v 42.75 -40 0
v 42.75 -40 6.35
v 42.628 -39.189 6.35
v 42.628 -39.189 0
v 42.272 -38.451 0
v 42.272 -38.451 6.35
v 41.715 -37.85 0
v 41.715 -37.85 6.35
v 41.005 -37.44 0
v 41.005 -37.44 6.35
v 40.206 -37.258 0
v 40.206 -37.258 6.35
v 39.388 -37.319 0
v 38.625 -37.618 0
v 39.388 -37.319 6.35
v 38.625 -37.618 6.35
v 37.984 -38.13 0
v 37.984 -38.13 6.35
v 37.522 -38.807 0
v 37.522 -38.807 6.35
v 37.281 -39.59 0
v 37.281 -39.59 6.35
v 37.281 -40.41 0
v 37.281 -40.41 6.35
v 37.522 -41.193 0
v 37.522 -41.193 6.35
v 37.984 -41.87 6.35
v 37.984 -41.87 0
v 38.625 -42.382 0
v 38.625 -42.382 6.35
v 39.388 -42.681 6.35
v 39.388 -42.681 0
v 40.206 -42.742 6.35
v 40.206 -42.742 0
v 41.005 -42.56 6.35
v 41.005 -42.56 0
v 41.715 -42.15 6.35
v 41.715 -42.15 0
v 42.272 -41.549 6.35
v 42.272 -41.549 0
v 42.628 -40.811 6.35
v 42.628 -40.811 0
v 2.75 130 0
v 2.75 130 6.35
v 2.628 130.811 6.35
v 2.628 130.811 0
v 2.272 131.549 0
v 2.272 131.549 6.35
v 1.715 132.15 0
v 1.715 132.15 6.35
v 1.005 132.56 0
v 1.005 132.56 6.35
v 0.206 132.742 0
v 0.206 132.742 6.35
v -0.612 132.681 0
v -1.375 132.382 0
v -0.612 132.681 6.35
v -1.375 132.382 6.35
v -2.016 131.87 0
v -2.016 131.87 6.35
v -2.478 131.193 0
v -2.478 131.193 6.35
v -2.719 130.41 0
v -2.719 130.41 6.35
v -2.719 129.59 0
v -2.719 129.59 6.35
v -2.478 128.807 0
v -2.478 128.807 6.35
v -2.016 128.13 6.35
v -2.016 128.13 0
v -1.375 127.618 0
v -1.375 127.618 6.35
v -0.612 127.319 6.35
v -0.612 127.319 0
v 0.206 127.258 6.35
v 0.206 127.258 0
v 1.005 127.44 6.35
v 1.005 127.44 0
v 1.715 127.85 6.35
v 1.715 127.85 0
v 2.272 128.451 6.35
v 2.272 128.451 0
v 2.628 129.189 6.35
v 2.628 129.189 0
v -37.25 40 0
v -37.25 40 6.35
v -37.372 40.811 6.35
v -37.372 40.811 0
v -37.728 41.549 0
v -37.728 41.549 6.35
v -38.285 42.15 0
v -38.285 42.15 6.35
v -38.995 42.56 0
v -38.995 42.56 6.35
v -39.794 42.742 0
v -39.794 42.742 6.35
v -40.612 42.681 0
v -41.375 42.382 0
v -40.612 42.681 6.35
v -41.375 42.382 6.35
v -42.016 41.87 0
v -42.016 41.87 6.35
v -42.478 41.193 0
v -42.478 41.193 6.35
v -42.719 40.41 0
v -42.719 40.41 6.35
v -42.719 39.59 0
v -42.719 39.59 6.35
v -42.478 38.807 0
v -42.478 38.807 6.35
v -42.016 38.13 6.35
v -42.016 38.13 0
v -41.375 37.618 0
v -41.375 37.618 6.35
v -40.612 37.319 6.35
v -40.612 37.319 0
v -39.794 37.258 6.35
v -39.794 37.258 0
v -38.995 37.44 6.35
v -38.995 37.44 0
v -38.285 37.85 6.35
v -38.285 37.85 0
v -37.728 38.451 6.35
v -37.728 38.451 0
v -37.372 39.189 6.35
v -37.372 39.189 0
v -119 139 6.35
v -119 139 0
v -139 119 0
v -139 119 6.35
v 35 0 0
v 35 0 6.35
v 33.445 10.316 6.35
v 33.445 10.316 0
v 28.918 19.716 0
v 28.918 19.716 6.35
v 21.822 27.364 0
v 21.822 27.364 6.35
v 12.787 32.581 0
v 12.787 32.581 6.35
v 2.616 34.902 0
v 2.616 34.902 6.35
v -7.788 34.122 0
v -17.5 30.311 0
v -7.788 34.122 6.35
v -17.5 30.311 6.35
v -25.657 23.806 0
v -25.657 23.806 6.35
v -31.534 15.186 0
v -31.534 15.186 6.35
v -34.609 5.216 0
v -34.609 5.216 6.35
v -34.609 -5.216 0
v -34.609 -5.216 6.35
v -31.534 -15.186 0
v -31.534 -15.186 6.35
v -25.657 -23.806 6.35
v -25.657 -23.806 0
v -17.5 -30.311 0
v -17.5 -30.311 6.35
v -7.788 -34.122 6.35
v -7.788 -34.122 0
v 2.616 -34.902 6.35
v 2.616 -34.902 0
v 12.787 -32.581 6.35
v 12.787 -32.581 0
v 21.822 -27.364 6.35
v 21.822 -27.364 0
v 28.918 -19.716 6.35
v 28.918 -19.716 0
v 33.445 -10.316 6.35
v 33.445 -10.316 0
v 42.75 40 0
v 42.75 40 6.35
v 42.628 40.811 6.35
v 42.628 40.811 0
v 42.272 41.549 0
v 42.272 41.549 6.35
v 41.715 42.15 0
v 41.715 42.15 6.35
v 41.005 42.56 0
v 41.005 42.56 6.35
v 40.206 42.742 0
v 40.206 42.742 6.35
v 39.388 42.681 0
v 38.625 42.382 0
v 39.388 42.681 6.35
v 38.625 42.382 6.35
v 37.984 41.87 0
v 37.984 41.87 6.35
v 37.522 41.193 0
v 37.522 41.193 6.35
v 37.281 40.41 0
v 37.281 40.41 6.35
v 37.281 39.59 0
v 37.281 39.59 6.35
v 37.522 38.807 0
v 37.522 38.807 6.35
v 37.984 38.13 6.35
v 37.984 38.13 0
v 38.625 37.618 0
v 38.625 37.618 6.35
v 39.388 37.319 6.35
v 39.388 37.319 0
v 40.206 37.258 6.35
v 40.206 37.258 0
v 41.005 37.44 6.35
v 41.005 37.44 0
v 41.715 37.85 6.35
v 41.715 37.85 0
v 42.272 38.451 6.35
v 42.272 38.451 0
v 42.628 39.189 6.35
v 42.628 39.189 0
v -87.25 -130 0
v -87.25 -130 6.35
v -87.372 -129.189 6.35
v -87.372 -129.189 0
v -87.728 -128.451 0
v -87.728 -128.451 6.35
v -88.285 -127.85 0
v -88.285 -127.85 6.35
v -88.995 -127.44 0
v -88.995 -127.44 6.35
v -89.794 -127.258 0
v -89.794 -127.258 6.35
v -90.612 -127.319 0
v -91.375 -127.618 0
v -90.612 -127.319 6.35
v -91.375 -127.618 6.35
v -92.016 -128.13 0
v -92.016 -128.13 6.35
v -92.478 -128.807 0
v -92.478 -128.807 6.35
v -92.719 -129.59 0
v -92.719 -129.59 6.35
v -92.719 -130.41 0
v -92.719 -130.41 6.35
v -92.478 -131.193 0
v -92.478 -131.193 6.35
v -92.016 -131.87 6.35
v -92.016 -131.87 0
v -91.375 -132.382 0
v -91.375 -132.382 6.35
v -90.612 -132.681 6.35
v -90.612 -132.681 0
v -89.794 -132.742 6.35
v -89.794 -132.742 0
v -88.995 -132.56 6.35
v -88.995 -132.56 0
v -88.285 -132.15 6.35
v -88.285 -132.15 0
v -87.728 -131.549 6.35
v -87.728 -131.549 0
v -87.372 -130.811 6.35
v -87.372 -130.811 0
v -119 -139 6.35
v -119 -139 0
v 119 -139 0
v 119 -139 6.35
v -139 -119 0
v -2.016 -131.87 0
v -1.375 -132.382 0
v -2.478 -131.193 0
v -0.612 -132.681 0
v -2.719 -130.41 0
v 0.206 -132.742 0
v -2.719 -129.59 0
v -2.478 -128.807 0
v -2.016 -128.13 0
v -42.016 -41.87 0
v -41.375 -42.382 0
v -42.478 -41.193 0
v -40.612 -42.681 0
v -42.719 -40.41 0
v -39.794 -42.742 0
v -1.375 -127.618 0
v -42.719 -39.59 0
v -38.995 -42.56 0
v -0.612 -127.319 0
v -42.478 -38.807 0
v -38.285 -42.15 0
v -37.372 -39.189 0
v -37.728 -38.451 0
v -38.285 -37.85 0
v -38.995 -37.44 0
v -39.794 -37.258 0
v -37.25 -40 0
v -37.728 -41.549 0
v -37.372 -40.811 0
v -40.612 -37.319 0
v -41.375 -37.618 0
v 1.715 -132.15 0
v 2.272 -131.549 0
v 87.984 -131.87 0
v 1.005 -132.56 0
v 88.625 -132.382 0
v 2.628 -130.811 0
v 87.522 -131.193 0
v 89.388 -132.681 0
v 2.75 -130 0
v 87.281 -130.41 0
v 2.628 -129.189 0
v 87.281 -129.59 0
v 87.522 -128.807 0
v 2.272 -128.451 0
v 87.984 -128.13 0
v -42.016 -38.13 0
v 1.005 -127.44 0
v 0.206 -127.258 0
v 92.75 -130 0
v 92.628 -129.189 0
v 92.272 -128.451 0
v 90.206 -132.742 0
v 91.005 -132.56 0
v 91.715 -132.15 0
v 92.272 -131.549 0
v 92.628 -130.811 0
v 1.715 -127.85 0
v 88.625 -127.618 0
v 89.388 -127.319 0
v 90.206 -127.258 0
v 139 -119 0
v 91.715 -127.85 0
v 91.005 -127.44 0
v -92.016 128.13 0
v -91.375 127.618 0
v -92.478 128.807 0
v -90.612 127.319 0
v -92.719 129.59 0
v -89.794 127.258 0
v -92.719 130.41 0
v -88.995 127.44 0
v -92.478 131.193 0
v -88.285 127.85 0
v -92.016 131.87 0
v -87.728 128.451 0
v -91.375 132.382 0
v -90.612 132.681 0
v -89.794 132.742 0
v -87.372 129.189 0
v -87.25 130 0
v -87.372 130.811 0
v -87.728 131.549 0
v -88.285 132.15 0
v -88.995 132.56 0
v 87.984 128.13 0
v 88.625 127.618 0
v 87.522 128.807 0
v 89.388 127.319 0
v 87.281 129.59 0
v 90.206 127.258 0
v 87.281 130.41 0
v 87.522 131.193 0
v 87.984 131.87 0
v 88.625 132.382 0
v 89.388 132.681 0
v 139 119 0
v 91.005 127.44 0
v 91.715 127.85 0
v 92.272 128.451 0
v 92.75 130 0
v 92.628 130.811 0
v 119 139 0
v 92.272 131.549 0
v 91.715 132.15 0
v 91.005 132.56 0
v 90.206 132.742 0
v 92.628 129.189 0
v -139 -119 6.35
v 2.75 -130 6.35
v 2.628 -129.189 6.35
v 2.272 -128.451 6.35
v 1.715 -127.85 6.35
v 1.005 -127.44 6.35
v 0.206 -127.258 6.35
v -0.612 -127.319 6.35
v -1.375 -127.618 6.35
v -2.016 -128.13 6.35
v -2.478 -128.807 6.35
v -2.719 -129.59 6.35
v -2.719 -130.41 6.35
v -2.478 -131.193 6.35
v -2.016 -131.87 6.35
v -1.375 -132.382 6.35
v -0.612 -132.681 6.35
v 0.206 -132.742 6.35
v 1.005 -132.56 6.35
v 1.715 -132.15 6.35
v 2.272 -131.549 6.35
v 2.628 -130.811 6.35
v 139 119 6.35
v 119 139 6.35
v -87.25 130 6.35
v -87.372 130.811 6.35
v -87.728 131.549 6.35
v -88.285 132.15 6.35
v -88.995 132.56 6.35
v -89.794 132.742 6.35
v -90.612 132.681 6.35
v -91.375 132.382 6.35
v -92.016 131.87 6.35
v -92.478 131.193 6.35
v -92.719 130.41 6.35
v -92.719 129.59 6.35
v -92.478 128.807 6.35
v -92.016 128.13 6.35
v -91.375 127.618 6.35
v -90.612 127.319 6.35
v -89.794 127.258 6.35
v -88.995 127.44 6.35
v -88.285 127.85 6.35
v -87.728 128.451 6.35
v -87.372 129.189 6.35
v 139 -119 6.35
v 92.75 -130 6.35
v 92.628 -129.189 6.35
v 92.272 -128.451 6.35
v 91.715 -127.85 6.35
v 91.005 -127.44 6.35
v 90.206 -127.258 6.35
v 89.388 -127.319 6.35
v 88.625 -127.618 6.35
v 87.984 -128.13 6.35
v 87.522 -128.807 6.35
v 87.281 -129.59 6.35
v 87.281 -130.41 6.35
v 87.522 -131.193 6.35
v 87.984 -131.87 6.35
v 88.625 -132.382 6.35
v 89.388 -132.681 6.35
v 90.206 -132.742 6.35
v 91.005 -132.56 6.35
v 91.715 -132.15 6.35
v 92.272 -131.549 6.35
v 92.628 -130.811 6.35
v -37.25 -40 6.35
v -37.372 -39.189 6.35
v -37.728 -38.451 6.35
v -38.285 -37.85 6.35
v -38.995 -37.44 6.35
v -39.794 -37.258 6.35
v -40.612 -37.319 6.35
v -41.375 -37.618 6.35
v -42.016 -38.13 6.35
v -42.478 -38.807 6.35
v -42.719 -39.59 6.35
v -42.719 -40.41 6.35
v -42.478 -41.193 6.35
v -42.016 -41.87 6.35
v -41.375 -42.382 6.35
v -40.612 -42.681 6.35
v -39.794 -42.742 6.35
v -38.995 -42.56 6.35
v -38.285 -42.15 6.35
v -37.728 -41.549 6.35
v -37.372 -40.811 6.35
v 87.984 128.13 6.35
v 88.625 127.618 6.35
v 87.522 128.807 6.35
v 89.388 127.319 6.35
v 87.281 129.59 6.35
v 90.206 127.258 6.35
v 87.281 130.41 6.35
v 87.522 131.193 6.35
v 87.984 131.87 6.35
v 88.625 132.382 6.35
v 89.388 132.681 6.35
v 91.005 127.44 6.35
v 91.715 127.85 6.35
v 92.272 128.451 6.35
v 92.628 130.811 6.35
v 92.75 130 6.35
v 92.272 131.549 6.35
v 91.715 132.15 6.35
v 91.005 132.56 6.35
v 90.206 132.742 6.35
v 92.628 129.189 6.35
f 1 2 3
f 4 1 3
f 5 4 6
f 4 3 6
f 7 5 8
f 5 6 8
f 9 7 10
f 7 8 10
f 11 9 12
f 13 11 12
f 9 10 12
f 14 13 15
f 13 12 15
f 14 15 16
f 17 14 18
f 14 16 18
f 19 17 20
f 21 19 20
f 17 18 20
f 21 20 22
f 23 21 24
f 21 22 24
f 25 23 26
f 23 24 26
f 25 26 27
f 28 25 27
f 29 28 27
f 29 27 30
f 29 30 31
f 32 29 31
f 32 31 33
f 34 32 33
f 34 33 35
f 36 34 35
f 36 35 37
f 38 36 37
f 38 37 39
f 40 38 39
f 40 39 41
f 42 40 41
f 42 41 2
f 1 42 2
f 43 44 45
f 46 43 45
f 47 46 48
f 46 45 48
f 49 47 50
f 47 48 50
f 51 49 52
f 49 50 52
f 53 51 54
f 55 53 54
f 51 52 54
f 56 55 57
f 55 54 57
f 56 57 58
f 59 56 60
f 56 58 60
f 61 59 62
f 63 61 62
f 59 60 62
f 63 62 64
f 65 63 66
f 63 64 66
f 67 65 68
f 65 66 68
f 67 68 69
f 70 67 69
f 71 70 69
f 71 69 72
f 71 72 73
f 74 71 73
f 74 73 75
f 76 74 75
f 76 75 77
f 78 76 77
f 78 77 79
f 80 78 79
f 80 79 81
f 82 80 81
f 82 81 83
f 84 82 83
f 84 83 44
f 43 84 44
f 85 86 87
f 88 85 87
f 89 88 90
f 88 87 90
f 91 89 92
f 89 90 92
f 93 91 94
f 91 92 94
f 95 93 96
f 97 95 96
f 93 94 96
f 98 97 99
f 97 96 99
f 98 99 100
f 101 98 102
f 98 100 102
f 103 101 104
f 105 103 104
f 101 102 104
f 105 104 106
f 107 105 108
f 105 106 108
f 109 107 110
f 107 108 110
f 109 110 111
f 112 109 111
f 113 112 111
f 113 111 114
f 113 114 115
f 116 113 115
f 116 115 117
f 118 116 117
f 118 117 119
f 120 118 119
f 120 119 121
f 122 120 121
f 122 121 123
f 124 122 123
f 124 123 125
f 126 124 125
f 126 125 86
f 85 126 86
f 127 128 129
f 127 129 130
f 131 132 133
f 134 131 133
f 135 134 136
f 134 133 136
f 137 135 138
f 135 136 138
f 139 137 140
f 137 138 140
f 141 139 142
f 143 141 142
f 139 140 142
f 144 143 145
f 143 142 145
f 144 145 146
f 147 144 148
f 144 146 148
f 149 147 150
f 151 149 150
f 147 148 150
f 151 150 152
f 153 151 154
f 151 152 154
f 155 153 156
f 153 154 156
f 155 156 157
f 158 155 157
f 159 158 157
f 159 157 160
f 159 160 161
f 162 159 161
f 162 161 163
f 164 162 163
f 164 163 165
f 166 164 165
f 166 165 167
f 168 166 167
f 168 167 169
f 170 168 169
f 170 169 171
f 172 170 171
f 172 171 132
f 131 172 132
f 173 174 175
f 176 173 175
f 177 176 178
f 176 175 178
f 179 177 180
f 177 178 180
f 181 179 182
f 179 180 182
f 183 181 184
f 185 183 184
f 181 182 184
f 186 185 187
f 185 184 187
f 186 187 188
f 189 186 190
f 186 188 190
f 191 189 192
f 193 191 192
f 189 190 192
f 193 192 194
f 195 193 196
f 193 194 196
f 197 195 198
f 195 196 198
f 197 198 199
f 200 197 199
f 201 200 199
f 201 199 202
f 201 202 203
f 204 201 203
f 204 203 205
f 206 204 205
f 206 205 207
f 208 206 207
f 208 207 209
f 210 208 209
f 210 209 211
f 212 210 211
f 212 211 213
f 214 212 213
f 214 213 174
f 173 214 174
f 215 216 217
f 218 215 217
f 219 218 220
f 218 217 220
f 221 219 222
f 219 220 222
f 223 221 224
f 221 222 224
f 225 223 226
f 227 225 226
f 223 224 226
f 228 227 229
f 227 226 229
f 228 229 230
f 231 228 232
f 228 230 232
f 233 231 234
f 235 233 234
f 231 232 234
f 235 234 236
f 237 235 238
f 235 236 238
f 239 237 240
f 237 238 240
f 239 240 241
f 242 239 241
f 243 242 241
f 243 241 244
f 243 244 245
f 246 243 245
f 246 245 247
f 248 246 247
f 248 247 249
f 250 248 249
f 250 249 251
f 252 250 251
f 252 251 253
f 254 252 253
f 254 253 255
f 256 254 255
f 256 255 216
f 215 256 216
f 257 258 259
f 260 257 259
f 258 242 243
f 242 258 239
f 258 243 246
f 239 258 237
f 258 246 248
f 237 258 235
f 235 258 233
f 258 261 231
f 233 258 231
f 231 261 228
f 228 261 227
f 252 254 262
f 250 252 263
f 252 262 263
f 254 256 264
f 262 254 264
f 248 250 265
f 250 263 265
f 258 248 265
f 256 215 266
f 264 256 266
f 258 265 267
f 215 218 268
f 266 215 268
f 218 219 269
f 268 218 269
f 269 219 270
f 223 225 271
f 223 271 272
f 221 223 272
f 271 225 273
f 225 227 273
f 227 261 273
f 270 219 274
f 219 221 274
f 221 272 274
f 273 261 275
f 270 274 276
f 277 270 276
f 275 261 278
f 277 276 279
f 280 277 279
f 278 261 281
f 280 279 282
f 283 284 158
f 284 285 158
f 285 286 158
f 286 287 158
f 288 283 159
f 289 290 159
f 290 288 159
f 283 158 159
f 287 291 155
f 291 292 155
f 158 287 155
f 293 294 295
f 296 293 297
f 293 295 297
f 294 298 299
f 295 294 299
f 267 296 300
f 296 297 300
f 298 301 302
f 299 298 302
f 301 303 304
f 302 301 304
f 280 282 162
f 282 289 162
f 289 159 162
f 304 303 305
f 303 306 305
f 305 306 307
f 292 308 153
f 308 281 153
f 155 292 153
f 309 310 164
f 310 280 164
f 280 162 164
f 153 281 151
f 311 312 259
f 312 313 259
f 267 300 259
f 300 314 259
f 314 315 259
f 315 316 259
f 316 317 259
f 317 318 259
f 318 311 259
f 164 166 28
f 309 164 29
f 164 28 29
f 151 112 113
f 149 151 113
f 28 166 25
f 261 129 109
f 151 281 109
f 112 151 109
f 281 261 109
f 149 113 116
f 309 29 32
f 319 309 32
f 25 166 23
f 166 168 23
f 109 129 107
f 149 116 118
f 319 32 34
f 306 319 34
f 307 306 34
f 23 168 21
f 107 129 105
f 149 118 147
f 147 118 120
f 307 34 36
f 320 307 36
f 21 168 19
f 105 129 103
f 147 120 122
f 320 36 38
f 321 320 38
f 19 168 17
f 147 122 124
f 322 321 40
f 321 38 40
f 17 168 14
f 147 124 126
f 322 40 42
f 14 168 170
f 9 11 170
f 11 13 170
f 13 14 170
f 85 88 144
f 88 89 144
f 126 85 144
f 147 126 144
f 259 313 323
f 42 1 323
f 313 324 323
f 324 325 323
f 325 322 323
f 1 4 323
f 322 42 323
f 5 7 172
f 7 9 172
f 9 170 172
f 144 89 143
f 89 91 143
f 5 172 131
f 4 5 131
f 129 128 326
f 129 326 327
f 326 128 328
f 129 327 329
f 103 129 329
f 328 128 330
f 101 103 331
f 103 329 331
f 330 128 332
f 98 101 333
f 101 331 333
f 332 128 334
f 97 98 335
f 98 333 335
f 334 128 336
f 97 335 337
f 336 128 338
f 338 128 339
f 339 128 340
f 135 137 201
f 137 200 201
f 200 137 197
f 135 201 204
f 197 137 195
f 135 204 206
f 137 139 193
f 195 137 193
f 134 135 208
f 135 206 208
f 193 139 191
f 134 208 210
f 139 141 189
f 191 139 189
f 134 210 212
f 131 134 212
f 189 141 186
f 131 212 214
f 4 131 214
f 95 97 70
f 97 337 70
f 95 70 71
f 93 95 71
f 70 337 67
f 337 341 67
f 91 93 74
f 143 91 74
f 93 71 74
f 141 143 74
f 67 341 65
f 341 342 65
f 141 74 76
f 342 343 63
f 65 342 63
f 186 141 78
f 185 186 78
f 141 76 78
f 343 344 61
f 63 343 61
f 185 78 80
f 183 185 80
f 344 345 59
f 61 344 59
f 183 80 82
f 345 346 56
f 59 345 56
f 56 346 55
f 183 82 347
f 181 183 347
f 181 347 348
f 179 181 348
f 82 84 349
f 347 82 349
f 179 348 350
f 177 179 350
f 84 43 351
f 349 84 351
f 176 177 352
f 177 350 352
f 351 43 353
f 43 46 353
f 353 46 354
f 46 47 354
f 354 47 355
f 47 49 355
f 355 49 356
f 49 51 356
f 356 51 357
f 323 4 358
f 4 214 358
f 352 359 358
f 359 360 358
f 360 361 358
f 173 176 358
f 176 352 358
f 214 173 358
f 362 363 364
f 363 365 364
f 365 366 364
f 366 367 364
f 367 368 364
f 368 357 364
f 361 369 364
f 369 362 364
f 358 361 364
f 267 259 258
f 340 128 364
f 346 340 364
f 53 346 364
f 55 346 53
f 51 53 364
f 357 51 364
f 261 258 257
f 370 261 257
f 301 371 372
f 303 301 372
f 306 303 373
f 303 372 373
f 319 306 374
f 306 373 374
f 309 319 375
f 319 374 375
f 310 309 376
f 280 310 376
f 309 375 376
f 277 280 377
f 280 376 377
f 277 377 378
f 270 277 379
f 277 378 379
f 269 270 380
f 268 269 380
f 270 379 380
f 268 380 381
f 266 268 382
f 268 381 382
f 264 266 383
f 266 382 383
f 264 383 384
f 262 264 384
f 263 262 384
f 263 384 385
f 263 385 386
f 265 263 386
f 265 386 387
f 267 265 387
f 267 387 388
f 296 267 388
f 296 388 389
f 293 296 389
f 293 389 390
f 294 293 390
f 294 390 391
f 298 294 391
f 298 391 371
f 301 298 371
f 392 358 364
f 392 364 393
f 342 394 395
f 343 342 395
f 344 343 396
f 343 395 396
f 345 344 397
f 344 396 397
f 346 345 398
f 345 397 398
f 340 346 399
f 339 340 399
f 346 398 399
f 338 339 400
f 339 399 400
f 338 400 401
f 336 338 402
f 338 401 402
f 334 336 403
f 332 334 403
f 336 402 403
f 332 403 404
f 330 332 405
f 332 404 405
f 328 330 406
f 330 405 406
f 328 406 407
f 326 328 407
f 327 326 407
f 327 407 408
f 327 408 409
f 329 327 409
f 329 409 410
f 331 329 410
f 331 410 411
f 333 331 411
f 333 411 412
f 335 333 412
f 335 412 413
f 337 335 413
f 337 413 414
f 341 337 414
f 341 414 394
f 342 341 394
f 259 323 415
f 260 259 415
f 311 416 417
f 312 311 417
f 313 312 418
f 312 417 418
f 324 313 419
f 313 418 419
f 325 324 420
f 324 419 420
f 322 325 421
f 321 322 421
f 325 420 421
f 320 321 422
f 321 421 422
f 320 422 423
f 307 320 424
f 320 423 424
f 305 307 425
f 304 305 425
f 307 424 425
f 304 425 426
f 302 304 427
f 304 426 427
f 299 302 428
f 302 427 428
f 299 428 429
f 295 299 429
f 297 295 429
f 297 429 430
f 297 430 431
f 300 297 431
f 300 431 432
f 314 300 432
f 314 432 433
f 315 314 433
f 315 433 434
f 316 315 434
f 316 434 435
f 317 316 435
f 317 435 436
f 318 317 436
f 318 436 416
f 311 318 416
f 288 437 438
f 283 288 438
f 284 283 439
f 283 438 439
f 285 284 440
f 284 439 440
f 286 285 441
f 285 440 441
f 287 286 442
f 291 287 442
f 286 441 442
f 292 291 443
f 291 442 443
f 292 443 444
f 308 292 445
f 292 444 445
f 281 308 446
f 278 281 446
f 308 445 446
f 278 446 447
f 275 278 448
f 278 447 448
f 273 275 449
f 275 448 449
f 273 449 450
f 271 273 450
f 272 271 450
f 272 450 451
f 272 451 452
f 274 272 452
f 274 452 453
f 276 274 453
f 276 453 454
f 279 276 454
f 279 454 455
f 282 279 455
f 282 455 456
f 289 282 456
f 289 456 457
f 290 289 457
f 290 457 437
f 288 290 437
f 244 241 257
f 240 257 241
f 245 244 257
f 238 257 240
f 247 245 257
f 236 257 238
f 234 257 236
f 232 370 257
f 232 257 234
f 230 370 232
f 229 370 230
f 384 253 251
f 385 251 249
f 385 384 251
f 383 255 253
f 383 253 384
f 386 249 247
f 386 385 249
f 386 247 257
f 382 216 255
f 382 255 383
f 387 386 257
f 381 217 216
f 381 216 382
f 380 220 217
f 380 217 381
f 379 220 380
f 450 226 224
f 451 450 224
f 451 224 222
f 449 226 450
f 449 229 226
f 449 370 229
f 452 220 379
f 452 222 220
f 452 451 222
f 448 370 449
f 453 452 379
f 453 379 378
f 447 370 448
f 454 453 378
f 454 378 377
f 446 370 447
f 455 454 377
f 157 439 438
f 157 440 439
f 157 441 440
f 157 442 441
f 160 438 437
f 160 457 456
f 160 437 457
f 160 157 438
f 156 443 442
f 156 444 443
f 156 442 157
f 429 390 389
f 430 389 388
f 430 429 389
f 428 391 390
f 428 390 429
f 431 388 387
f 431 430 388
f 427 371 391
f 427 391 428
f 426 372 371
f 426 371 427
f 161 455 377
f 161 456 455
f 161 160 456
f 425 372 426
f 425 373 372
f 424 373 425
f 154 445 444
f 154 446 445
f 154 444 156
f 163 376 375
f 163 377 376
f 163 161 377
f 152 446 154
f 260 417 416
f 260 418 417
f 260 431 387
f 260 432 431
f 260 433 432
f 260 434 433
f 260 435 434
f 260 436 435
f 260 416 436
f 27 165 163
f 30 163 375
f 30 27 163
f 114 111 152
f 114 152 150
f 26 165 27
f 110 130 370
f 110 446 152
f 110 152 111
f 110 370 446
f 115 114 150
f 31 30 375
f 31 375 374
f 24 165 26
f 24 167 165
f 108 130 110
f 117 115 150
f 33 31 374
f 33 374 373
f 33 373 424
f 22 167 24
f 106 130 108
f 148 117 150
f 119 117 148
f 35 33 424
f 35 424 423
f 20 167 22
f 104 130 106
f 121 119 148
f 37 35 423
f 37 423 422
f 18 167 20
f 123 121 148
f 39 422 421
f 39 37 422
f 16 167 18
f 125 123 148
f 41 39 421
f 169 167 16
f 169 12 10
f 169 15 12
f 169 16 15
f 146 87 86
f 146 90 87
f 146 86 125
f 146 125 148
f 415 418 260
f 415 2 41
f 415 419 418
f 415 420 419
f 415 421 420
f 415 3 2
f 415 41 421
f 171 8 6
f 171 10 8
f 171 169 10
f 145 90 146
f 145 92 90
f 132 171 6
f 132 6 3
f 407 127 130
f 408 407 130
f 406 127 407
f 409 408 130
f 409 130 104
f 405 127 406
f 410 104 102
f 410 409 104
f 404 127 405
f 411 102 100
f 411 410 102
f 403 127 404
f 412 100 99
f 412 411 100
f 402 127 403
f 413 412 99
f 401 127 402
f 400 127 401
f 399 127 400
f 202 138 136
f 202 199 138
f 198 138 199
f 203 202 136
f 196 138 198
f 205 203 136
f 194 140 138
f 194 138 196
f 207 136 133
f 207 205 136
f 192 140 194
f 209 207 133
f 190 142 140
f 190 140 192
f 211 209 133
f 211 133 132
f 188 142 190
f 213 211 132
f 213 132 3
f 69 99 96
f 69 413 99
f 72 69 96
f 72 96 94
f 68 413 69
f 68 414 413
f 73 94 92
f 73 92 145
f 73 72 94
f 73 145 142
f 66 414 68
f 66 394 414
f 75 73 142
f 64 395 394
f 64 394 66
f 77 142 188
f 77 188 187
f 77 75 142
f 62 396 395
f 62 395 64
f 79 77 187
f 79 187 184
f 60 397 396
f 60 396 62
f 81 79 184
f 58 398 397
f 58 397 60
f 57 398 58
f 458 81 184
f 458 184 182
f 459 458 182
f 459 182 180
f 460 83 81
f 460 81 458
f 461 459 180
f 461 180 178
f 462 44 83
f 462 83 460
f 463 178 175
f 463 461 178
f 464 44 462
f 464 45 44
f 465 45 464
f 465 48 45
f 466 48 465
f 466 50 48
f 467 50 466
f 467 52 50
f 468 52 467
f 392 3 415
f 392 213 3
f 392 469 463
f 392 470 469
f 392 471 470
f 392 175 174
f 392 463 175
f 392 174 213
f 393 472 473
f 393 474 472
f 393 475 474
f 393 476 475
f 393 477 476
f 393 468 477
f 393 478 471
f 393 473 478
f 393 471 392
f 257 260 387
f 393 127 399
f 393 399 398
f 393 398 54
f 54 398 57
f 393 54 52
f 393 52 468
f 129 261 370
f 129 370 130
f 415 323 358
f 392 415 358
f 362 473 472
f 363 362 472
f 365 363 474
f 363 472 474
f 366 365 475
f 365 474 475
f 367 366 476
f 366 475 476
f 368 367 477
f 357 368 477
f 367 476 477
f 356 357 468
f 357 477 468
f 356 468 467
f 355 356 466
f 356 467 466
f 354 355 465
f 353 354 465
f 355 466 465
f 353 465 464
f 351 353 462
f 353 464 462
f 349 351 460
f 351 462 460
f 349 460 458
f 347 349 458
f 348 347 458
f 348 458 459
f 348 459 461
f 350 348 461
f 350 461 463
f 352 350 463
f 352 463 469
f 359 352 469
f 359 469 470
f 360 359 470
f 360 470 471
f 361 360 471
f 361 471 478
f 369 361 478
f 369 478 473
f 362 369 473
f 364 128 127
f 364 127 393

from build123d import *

# Parameters (mm, degrees)
SKETCH1_W           = 278
SKETCH1_H           = 278
BOSS_EXTRUDE1_DEPTH = 6.35
SKETCH2_R           = 35
SKETCH2_R_2         = 2.75
CUT_EXTRUDE1_DEPTH  = 7.35
CHAMFER1_SIZE       = 20
SKETCH4_R           = 2.75
CUT_EXTRUDE2_DEPTH  = 76.2


with BuildPart() as part:
    # Sketch1 → Boss-Extrude1 (new body)
    with BuildSketch(Plane.XY):
        Rectangle(SKETCH1_W, SKETCH1_H)
    extrude(amount=BOSS_EXTRUDE1_DEPTH)

    # Sketch2 → Cut-Extrude1 (cut, through all)
    with BuildSketch(Plane.XY.offset(6.35)):
        Circle(SKETCH2_R)
        with Locations((-40, 40)):
            Circle(SKETCH2_R_2)
        with Locations((40, 40)):
            Circle(SKETCH2_R_2)
        with Locations((40, -40)):
            Circle(SKETCH2_R_2)
        with Locations((-40, -40)):
            Circle(SKETCH2_R_2)
    extrude(amount=-CUT_EXTRUDE1_DEPTH, mode=Mode.SUBTRACT)

    # Chamfer1
    chamfer1_edges = [part.edges().sort_by_distance(p)[0] for p in [
        (-139, 139, 3.175),
        (139, 139, 3.175),
        (139, -139, 3.175),
        (-139, -139, 3.175),
    ]]
    chamfer(chamfer1_edges, length=CHAMFER1_SIZE)

    # Sketch4 → Cut-Extrude2 (cut)
    with BuildSketch(Plane.XY.offset(6.35)):
        with Locations((-90, 130)):
            Circle(SKETCH4_R)
        with Locations((0, 130)):
            Circle(SKETCH4_R)
        with Locations((90, 130)):
            Circle(SKETCH4_R)
        with Locations((90, -130)):
            Circle(SKETCH4_R)
        with Locations((0, -130)):
            Circle(SKETCH4_R)
        with Locations((-90, -130)):
            Circle(SKETCH4_R)
    extrude(amount=-CUT_EXTRUDE2_DEPTH, mode=Mode.SUBTRACT)


solid = part.part
